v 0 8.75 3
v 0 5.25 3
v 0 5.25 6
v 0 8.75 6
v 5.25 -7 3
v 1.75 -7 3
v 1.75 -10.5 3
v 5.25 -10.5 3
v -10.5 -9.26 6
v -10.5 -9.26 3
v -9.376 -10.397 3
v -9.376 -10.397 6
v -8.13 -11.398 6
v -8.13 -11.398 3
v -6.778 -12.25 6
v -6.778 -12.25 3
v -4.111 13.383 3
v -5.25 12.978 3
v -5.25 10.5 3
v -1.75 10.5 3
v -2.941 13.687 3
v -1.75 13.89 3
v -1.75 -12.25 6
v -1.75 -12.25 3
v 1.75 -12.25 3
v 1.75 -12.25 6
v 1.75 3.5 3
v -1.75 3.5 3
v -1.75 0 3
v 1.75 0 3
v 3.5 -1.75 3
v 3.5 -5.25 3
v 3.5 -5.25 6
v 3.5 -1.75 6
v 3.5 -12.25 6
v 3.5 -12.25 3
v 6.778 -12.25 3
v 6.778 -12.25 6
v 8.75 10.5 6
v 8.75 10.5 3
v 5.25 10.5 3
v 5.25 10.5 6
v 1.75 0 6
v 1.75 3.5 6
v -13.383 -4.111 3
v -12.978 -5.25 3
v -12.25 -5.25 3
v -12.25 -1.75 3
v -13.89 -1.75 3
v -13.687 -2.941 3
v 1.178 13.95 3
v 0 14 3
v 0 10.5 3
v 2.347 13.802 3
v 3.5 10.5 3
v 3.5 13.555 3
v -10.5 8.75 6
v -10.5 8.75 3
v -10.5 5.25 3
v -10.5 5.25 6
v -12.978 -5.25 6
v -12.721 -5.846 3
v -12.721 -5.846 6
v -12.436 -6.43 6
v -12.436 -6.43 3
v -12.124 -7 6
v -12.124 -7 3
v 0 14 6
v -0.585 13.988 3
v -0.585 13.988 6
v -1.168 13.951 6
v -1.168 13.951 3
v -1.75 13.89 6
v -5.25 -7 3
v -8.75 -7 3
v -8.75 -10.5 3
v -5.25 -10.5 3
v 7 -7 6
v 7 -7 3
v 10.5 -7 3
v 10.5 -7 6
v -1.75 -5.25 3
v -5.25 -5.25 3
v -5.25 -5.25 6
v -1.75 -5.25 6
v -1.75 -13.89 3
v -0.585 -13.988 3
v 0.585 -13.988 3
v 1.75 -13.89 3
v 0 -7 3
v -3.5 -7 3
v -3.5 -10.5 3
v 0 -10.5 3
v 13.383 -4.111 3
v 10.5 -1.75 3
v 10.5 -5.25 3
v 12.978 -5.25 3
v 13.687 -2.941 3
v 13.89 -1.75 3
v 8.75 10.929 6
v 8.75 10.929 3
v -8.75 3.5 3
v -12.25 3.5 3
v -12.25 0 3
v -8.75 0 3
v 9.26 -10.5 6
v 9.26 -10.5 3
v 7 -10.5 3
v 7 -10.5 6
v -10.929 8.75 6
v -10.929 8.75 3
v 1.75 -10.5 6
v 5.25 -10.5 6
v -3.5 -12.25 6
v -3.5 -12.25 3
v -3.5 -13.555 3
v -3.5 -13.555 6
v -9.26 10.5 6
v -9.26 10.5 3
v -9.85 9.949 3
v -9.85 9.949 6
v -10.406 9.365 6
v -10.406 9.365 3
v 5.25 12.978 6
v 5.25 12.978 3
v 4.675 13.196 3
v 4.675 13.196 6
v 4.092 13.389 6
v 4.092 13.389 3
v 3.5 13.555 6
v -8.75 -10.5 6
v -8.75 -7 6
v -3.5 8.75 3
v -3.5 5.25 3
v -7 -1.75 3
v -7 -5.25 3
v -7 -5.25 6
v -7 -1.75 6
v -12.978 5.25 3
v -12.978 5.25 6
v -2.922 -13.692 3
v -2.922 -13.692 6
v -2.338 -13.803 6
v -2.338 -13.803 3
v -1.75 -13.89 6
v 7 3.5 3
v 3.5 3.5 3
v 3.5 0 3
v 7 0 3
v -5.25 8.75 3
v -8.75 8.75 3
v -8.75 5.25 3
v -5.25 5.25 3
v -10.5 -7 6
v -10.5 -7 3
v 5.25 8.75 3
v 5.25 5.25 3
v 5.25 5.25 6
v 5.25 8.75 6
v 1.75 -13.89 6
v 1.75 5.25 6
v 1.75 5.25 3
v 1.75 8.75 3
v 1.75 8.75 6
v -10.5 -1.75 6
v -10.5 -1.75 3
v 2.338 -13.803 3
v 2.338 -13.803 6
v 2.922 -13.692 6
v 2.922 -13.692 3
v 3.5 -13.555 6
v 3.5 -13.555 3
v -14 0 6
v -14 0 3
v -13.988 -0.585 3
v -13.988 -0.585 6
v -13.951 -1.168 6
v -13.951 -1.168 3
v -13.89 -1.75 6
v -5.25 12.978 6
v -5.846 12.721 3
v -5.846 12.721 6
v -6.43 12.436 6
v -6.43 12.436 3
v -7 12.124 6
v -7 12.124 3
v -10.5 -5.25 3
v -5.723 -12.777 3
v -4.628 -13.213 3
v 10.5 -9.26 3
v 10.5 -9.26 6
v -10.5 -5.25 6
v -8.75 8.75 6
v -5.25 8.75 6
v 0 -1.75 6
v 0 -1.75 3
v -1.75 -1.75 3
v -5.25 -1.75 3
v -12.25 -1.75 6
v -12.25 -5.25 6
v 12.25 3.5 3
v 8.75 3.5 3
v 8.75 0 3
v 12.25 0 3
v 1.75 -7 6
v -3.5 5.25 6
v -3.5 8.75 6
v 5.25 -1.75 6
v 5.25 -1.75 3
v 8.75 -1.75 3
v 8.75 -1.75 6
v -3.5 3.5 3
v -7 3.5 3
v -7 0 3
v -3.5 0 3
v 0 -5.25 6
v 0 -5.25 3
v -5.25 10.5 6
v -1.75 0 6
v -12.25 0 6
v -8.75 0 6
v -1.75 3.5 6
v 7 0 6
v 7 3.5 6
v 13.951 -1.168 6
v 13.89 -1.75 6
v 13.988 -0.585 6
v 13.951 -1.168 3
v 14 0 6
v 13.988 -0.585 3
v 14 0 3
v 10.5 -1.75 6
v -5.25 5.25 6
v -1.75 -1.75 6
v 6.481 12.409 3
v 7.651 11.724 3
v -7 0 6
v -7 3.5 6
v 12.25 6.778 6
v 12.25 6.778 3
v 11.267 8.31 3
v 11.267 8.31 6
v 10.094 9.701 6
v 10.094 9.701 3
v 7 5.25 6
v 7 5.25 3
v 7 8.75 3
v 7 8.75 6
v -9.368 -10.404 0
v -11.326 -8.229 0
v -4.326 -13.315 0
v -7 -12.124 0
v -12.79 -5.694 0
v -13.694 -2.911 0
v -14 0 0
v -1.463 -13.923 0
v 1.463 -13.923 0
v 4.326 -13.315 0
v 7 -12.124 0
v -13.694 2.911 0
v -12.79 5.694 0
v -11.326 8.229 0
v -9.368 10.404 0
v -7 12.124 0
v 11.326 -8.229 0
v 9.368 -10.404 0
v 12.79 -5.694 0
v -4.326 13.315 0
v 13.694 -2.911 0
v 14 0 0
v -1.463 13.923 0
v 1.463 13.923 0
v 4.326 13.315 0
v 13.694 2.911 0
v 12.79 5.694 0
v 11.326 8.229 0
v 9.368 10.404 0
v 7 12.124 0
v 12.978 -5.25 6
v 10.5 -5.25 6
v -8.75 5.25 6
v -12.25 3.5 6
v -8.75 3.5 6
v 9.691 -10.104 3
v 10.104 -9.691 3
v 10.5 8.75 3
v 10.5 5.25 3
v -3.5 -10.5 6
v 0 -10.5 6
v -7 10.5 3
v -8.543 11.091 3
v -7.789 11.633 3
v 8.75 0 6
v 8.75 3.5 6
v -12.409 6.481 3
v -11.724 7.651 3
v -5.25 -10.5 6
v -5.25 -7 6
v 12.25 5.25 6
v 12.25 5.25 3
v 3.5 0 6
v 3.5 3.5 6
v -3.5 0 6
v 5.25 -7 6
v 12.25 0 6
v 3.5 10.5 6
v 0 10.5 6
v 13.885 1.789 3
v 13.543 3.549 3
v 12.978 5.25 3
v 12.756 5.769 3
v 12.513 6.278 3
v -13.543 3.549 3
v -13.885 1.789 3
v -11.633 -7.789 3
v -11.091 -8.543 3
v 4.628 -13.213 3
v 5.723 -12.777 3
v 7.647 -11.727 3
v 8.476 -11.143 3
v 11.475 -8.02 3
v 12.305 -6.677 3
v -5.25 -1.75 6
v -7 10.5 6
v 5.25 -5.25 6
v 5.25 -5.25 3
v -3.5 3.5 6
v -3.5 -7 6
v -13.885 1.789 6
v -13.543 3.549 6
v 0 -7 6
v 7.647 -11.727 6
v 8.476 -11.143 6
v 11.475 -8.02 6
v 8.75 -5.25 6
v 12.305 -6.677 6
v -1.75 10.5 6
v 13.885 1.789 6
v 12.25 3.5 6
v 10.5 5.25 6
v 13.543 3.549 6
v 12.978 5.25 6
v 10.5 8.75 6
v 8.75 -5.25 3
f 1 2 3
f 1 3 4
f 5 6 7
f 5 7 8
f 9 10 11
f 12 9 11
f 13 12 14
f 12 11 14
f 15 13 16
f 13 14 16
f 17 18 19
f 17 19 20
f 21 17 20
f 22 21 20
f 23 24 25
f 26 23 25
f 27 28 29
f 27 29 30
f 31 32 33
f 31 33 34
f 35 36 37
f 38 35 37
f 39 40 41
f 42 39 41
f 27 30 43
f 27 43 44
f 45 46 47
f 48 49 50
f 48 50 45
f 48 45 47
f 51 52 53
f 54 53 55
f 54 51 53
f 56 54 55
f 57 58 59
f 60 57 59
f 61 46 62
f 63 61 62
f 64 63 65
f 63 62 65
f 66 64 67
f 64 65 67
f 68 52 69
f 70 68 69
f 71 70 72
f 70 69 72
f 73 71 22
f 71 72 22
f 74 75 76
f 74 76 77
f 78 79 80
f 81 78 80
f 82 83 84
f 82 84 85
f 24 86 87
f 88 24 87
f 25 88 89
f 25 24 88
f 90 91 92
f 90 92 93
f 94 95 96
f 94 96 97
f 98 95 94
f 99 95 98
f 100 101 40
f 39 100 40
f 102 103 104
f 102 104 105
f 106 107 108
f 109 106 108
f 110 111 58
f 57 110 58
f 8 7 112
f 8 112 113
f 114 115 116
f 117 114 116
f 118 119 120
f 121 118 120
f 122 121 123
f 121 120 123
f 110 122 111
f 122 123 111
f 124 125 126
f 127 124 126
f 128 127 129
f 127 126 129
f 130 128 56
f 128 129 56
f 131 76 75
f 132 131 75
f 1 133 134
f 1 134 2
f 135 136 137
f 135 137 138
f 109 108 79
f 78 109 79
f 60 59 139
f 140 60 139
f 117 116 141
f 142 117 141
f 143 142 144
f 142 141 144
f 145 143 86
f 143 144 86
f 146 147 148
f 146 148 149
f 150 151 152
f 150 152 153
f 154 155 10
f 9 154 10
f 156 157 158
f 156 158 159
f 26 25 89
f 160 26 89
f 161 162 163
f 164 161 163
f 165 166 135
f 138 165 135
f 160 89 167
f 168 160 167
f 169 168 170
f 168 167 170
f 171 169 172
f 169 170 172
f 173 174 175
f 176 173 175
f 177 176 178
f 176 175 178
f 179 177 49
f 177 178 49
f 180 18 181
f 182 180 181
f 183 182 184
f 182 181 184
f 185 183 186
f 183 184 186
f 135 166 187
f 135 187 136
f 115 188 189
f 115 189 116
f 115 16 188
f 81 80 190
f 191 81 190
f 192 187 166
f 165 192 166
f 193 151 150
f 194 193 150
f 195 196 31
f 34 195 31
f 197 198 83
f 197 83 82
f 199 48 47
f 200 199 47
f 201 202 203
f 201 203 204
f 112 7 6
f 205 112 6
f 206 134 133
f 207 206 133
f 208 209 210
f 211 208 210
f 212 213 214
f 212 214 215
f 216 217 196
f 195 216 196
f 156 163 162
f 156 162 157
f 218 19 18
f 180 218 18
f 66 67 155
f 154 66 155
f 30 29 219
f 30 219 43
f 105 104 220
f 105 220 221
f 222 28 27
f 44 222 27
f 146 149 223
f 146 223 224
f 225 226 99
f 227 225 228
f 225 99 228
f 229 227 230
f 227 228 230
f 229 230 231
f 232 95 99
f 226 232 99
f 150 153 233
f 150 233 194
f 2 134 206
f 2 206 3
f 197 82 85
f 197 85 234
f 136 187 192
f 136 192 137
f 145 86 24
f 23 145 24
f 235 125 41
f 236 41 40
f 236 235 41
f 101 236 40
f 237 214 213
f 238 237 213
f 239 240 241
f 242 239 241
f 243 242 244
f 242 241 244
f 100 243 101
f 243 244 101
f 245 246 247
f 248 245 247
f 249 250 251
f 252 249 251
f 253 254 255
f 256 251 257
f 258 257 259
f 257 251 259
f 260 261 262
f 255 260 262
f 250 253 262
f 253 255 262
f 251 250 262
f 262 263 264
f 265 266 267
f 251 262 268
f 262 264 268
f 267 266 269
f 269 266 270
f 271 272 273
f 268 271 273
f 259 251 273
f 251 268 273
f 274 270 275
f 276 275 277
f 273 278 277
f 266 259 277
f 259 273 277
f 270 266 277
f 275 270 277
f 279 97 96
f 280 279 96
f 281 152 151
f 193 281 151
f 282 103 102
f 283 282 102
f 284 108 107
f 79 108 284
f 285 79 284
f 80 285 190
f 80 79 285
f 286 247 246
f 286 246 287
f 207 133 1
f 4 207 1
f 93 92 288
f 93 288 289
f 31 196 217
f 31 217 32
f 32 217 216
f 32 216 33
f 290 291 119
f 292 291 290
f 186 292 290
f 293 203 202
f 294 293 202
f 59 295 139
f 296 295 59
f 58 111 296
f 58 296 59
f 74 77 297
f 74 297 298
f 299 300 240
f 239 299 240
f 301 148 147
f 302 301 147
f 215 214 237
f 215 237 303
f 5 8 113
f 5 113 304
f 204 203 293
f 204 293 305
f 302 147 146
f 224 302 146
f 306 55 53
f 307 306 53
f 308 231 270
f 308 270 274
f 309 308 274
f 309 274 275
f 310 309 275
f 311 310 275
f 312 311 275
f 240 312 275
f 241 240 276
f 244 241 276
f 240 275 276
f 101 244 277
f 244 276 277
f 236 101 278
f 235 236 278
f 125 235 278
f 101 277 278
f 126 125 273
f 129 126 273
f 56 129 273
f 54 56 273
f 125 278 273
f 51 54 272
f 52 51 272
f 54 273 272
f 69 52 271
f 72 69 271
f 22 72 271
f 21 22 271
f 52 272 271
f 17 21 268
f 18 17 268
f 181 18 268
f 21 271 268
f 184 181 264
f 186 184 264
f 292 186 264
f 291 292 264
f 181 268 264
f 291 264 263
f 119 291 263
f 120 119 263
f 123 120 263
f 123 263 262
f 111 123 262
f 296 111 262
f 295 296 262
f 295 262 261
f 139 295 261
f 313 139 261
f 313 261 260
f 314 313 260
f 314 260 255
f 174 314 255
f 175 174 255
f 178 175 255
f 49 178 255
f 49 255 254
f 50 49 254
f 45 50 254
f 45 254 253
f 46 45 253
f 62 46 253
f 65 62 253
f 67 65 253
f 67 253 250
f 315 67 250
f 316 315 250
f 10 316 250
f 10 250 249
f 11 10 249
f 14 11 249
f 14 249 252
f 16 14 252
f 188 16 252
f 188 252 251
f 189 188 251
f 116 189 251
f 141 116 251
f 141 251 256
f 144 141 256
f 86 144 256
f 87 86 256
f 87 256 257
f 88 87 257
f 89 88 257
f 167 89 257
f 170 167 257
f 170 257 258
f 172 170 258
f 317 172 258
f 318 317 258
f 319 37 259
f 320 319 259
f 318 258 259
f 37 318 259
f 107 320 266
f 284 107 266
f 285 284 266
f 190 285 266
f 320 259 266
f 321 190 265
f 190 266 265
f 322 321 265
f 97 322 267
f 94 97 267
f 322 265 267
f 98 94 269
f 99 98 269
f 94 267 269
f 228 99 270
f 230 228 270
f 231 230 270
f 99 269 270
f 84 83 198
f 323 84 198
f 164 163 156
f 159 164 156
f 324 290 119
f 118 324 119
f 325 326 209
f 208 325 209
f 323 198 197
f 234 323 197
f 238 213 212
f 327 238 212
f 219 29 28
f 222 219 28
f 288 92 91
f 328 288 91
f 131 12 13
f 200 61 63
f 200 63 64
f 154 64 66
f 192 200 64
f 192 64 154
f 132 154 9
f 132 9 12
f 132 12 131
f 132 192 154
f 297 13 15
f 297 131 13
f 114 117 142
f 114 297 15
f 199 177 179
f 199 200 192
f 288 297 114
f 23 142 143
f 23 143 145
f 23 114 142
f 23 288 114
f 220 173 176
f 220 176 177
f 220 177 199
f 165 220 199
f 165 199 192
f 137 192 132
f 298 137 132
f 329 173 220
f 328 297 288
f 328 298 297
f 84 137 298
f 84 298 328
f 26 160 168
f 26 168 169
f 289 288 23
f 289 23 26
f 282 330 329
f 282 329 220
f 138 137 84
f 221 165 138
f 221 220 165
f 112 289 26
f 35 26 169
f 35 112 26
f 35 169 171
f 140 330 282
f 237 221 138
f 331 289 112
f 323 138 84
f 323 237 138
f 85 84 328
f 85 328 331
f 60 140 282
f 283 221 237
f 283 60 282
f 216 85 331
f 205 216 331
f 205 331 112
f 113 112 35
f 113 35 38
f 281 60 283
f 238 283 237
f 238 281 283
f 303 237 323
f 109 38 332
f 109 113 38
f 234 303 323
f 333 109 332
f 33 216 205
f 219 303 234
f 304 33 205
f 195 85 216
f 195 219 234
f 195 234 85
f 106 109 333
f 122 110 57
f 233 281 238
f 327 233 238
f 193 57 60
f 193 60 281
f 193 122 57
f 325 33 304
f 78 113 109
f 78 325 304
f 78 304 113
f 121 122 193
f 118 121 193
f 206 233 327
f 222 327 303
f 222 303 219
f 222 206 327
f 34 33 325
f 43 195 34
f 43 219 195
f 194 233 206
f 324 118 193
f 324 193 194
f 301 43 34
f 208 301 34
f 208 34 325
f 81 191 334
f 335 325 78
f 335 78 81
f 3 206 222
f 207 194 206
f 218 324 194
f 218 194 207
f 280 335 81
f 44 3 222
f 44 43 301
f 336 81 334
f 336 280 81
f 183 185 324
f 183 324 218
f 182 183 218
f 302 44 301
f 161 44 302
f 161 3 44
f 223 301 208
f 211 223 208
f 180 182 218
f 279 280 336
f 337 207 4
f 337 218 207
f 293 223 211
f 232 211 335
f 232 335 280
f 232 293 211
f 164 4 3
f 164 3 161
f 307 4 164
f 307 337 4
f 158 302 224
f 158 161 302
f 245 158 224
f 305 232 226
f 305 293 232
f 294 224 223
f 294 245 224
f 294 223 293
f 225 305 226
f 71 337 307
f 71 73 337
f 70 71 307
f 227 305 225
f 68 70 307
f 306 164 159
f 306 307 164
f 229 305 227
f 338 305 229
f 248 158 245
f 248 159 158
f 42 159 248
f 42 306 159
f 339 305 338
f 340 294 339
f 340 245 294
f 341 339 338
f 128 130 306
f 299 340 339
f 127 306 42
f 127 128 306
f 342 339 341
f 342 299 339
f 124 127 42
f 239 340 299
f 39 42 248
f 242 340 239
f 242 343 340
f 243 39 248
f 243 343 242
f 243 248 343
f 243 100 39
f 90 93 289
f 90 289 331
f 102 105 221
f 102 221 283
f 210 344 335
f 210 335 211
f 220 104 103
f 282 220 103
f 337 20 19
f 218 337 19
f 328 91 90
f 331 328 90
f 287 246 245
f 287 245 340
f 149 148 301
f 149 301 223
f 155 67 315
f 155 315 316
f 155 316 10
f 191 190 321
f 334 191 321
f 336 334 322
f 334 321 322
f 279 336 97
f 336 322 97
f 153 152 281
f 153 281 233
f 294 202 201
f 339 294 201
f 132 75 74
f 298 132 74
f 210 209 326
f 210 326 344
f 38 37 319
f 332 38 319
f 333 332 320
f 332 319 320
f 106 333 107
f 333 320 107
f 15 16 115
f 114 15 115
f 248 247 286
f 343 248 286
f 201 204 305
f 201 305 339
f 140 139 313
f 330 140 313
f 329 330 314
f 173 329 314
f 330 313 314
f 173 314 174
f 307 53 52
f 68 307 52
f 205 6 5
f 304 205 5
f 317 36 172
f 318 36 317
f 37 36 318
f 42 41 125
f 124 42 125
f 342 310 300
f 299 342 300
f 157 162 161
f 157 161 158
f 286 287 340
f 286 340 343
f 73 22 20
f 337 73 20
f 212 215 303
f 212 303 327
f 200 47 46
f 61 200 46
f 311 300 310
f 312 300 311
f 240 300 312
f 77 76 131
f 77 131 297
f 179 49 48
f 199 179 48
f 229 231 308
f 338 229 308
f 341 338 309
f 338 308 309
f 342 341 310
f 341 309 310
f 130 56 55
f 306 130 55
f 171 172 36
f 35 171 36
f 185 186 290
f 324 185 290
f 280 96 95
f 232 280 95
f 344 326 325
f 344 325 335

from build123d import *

# Parameters (mm, degrees)
F0_R     = 14
F1_DEPTH = 3
F2_W     = 3.5
F2_H     = 3.5
F3_DEPTH = 3


with BuildPart() as f1:
    # F0 (on Top) → F1 (new body)
    with BuildSketch(Plane.XY):
        Circle(F0_R)
    extrude(amount=F1_DEPTH)

    # F2 (on face) → F3 (join)
    with BuildSketch(Plane.XY.offset(3)):
        with BuildLine():
            ThreePointArc((-5.25, 12.9783473524), (-6.1398656708, 12.581814239), (-7, 12.124355653))
            Line((-7, 12.124355653), (-7, 10.5))
            Line((-7, 10.5), (-9.2601295887, 10.5))
            ThreePointArc((-9.2601295887, 10.5), (-10.1322901855, 9.6610918429), (-10.9287464972, 8.75))
            Line((-10.9287464972, 8.75), (-10.5, 8.75))
            Line((-10.5, 8.75), (-10.5, 5.25))
            Line((-10.5, 5.25), (-12.9783473524, 5.25))
            ThreePointArc((-12.9783473524, 5.25), (-13.742213485, 2.6742416744), (-14, 0))
            ThreePointArc((-14, 0), (-13.9725216293, -0.8767207756), (-13.8901943831, -1.75))
            Line((-13.8901943831, -1.75), (-12.25, -1.75))
            Line((-12.25, -1.75), (-12.25, -5.25))
            Line((-12.25, -5.25), (-12.9783473524, -5.25))
            ThreePointArc((-12.9783473524, -5.25), (-12.581814239, -6.1398656708), (-12.124355653, -7))
            Line((-12.124355653, -7), (-10.5, -7))
            Line((-10.5, -7), (-10.5, -9.2601295887))
            ThreePointArc((-10.5, -9.2601295887), (-8.7672538895, -10.914909951), (-6.7777208559, -12.25))
            Line((-6.7777208559, -12.25), (-3.5, -12.25))
            Line((-3.5, -12.25), (-3.5, -13.5554417117))
            ThreePointArc((-3.5, -13.5554417117), (-2.6303307468, -13.750685807), (-1.75, -13.8901943831))
            Line((-1.75, -13.8901943831), (-1.75, -12.25))
            Line((-1.75, -12.25), (1.75, -12.25))
            Line((1.75, -12.25), (1.75, -13.8901943831))
            ThreePointArc((1.75, -13.8901943831), (2.6303307468, -13.750685807), (3.5, -13.5554417117))
            Line((3.5, -13.5554417117), (3.5, -12.25))
            Line((3.5, -12.25), (6.7777208559, -12.25))
            ThreePointArc((6.7777208559, -12.25), (8.0665225916, -11.4425177858), (9.2601295887, -10.5))
            Line((9.2601295887, -10.5), (7, -10.5))
            Line((7, -10.5), (7, -7))
            Line((7, -7), (10.5, -7))
            Line((10.5, -7), (10.5, -9.2601295887))
            ThreePointArc((10.5, -9.2601295887), (11.9091764379, -7.3601302006), (12.9783473524, -5.25))
            Line((12.9783473524, -5.25), (10.5, -5.25))
            Line((10.5, -5.25), (10.5, -1.75))
            Line((10.5, -1.75), (13.8901943831, -1.75))
            ThreePointArc((13.8901943831, -1.75), (13.9725216293, -0.8767207756), (14, 0))
            ThreePointArc((14, 0), (13.742213485, 2.6742416744), (12.9783473524, 5.25))
            Line((12.9783473524, 5.25), (12.25, 5.25))
            Line((12.25, 5.25), (12.25, 6.7777208559))
            ThreePointArc((12.25, 6.7777208559), (10.7031655817, 9.024535807), (8.75, 10.9287464972))
            Line((8.75, 10.9287464972), (8.75, 10.5))
            Line((8.75, 10.5), (5.25, 10.5))
            Line((5.25, 10.5), (5.25, 12.9783473524))
            ThreePointArc((5.25, 12.9783473524), (4.3845050433, 13.2957179394), (3.5, 13.5554417117))
            Line((3.5, 13.5554417117), (3.5, 10.5))
            Line((3.5, 10.5), (0, 10.5))
            Line((0, 10.5), (0, 14))
            ThreePointArc((0, 14), (-0.8767207756, 13.9725216293), (-1.75, 13.8901943831))
            Line((-1.75, 13.8901943831), (-1.75, 10.5))
            Line((-1.75, 10.5), (-5.25, 10.5))
            Line((-5.25, 10.5), (-5.25, 12.9783473524))
        make_face()
        with Locations((-7, -8.75)):
            Rectangle(F2_W, F2_H, mode=Mode.SUBTRACT)
        with Locations((-1.75, -8.75)):
            Rectangle(F2_W, F2_H, mode=Mode.SUBTRACT)
        with Locations((3.5, -8.75)):
            Rectangle(F2_W, F2_H, mode=Mode.SUBTRACT)
        with Locations((-8.75, -3.5)):
            Rectangle(F2_W, F2_H, mode=Mode.SUBTRACT)
        with Locations((-3.5, -3.5)):
            Rectangle(F2_W, F2_H, mode=Mode.SUBTRACT)
        with Locations((1.75, -3.5)):
            Rectangle(F2_W, F2_H, mode=Mode.SUBTRACT)
        with Locations((7, -3.5)):
            Rectangle(F2_W, F2_H, mode=Mode.SUBTRACT)
        with Locations((-10.5, 1.75)):
            Rectangle(F2_W, F2_H, mode=Mode.SUBTRACT)
        with Locations((-5.25, 1.75)):
            Rectangle(F2_W, F2_H, mode=Mode.SUBTRACT)
        with Locations((0, 1.75)):
            Rectangle(F2_W, F2_H, mode=Mode.SUBTRACT)
        with Locations((5.25, 1.75)):
            Rectangle(F2_W, F2_H, mode=Mode.SUBTRACT)
        with Locations((-7, 7)):
            Rectangle(F2_W, F2_H, mode=Mode.SUBTRACT)
        with Locations((-1.75, 7)):
            Rectangle(F2_W, F2_H, mode=Mode.SUBTRACT)
        with Locations((3.5, 7)):
            Rectangle(F2_W, F2_H, mode=Mode.SUBTRACT)
        with Locations((10.5, 1.75)):
            Rectangle(F2_W, F2_H, mode=Mode.SUBTRACT)
        with Locations((8.75, 7)):
            Rectangle(F2_W, F2_H, mode=Mode.SUBTRACT)
    extrude(amount=F3_DEPTH)


solid = f1.part
